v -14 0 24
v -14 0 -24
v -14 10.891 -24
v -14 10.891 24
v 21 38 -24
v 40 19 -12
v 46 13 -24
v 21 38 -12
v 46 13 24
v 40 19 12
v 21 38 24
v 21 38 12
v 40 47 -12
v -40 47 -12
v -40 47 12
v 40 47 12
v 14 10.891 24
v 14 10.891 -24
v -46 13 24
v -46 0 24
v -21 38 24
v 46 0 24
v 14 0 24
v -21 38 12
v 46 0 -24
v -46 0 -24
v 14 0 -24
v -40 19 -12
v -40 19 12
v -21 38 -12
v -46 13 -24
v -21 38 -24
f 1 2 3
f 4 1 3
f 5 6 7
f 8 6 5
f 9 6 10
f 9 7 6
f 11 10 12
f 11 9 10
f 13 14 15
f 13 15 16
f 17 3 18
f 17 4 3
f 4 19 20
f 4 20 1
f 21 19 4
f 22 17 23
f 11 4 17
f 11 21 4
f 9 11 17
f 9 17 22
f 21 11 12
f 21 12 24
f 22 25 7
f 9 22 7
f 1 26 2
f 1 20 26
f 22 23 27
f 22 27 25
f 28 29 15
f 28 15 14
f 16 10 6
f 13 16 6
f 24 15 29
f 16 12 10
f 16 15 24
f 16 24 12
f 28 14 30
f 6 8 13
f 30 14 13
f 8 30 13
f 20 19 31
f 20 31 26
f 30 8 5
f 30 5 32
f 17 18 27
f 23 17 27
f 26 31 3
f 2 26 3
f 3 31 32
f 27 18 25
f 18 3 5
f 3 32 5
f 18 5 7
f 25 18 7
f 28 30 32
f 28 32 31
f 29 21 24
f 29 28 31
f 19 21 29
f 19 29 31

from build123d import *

# Parameters (mm, degrees)
BOSS_EXTRUDE1_DEPTH = 24
BOSS_EXTRUDE2_START = 47
SKETCH2_W           = 80
SKETCH2_H           = 24
BOSS_EXTRUDE2_DEPTH = 36


with BuildPart() as part:
    # Sketch1 → Boss-Extrude1 (new, symmetric)
    with BuildSketch(Plane.XY):
        Polygon((-14, 10.891224152), (0, 10.891224152), (0, 38), (-21, 38), (-46, 13), (-46, 0), (-14, 0), align=None)
        Polygon((14, 10.891224152), (14, 0), (46, 0), (46, 13), (21, 38), (0, 38), (0, 10.891224152), align=None)
    extrude(amount=BOSS_EXTRUDE1_DEPTH, both=True)

    # Sketch2 → Boss-Extrude2 (add)
    with BuildSketch(Plane(origin=(0, 0, 0), x_dir=(1, 0, 0), z_dir=(0, 1, 0)).offset(BOSS_EXTRUDE2_START)):
        Rectangle(SKETCH2_W, SKETCH2_H)
    extrude(amount=-BOSS_EXTRUDE2_DEPTH)


solid = part.part
